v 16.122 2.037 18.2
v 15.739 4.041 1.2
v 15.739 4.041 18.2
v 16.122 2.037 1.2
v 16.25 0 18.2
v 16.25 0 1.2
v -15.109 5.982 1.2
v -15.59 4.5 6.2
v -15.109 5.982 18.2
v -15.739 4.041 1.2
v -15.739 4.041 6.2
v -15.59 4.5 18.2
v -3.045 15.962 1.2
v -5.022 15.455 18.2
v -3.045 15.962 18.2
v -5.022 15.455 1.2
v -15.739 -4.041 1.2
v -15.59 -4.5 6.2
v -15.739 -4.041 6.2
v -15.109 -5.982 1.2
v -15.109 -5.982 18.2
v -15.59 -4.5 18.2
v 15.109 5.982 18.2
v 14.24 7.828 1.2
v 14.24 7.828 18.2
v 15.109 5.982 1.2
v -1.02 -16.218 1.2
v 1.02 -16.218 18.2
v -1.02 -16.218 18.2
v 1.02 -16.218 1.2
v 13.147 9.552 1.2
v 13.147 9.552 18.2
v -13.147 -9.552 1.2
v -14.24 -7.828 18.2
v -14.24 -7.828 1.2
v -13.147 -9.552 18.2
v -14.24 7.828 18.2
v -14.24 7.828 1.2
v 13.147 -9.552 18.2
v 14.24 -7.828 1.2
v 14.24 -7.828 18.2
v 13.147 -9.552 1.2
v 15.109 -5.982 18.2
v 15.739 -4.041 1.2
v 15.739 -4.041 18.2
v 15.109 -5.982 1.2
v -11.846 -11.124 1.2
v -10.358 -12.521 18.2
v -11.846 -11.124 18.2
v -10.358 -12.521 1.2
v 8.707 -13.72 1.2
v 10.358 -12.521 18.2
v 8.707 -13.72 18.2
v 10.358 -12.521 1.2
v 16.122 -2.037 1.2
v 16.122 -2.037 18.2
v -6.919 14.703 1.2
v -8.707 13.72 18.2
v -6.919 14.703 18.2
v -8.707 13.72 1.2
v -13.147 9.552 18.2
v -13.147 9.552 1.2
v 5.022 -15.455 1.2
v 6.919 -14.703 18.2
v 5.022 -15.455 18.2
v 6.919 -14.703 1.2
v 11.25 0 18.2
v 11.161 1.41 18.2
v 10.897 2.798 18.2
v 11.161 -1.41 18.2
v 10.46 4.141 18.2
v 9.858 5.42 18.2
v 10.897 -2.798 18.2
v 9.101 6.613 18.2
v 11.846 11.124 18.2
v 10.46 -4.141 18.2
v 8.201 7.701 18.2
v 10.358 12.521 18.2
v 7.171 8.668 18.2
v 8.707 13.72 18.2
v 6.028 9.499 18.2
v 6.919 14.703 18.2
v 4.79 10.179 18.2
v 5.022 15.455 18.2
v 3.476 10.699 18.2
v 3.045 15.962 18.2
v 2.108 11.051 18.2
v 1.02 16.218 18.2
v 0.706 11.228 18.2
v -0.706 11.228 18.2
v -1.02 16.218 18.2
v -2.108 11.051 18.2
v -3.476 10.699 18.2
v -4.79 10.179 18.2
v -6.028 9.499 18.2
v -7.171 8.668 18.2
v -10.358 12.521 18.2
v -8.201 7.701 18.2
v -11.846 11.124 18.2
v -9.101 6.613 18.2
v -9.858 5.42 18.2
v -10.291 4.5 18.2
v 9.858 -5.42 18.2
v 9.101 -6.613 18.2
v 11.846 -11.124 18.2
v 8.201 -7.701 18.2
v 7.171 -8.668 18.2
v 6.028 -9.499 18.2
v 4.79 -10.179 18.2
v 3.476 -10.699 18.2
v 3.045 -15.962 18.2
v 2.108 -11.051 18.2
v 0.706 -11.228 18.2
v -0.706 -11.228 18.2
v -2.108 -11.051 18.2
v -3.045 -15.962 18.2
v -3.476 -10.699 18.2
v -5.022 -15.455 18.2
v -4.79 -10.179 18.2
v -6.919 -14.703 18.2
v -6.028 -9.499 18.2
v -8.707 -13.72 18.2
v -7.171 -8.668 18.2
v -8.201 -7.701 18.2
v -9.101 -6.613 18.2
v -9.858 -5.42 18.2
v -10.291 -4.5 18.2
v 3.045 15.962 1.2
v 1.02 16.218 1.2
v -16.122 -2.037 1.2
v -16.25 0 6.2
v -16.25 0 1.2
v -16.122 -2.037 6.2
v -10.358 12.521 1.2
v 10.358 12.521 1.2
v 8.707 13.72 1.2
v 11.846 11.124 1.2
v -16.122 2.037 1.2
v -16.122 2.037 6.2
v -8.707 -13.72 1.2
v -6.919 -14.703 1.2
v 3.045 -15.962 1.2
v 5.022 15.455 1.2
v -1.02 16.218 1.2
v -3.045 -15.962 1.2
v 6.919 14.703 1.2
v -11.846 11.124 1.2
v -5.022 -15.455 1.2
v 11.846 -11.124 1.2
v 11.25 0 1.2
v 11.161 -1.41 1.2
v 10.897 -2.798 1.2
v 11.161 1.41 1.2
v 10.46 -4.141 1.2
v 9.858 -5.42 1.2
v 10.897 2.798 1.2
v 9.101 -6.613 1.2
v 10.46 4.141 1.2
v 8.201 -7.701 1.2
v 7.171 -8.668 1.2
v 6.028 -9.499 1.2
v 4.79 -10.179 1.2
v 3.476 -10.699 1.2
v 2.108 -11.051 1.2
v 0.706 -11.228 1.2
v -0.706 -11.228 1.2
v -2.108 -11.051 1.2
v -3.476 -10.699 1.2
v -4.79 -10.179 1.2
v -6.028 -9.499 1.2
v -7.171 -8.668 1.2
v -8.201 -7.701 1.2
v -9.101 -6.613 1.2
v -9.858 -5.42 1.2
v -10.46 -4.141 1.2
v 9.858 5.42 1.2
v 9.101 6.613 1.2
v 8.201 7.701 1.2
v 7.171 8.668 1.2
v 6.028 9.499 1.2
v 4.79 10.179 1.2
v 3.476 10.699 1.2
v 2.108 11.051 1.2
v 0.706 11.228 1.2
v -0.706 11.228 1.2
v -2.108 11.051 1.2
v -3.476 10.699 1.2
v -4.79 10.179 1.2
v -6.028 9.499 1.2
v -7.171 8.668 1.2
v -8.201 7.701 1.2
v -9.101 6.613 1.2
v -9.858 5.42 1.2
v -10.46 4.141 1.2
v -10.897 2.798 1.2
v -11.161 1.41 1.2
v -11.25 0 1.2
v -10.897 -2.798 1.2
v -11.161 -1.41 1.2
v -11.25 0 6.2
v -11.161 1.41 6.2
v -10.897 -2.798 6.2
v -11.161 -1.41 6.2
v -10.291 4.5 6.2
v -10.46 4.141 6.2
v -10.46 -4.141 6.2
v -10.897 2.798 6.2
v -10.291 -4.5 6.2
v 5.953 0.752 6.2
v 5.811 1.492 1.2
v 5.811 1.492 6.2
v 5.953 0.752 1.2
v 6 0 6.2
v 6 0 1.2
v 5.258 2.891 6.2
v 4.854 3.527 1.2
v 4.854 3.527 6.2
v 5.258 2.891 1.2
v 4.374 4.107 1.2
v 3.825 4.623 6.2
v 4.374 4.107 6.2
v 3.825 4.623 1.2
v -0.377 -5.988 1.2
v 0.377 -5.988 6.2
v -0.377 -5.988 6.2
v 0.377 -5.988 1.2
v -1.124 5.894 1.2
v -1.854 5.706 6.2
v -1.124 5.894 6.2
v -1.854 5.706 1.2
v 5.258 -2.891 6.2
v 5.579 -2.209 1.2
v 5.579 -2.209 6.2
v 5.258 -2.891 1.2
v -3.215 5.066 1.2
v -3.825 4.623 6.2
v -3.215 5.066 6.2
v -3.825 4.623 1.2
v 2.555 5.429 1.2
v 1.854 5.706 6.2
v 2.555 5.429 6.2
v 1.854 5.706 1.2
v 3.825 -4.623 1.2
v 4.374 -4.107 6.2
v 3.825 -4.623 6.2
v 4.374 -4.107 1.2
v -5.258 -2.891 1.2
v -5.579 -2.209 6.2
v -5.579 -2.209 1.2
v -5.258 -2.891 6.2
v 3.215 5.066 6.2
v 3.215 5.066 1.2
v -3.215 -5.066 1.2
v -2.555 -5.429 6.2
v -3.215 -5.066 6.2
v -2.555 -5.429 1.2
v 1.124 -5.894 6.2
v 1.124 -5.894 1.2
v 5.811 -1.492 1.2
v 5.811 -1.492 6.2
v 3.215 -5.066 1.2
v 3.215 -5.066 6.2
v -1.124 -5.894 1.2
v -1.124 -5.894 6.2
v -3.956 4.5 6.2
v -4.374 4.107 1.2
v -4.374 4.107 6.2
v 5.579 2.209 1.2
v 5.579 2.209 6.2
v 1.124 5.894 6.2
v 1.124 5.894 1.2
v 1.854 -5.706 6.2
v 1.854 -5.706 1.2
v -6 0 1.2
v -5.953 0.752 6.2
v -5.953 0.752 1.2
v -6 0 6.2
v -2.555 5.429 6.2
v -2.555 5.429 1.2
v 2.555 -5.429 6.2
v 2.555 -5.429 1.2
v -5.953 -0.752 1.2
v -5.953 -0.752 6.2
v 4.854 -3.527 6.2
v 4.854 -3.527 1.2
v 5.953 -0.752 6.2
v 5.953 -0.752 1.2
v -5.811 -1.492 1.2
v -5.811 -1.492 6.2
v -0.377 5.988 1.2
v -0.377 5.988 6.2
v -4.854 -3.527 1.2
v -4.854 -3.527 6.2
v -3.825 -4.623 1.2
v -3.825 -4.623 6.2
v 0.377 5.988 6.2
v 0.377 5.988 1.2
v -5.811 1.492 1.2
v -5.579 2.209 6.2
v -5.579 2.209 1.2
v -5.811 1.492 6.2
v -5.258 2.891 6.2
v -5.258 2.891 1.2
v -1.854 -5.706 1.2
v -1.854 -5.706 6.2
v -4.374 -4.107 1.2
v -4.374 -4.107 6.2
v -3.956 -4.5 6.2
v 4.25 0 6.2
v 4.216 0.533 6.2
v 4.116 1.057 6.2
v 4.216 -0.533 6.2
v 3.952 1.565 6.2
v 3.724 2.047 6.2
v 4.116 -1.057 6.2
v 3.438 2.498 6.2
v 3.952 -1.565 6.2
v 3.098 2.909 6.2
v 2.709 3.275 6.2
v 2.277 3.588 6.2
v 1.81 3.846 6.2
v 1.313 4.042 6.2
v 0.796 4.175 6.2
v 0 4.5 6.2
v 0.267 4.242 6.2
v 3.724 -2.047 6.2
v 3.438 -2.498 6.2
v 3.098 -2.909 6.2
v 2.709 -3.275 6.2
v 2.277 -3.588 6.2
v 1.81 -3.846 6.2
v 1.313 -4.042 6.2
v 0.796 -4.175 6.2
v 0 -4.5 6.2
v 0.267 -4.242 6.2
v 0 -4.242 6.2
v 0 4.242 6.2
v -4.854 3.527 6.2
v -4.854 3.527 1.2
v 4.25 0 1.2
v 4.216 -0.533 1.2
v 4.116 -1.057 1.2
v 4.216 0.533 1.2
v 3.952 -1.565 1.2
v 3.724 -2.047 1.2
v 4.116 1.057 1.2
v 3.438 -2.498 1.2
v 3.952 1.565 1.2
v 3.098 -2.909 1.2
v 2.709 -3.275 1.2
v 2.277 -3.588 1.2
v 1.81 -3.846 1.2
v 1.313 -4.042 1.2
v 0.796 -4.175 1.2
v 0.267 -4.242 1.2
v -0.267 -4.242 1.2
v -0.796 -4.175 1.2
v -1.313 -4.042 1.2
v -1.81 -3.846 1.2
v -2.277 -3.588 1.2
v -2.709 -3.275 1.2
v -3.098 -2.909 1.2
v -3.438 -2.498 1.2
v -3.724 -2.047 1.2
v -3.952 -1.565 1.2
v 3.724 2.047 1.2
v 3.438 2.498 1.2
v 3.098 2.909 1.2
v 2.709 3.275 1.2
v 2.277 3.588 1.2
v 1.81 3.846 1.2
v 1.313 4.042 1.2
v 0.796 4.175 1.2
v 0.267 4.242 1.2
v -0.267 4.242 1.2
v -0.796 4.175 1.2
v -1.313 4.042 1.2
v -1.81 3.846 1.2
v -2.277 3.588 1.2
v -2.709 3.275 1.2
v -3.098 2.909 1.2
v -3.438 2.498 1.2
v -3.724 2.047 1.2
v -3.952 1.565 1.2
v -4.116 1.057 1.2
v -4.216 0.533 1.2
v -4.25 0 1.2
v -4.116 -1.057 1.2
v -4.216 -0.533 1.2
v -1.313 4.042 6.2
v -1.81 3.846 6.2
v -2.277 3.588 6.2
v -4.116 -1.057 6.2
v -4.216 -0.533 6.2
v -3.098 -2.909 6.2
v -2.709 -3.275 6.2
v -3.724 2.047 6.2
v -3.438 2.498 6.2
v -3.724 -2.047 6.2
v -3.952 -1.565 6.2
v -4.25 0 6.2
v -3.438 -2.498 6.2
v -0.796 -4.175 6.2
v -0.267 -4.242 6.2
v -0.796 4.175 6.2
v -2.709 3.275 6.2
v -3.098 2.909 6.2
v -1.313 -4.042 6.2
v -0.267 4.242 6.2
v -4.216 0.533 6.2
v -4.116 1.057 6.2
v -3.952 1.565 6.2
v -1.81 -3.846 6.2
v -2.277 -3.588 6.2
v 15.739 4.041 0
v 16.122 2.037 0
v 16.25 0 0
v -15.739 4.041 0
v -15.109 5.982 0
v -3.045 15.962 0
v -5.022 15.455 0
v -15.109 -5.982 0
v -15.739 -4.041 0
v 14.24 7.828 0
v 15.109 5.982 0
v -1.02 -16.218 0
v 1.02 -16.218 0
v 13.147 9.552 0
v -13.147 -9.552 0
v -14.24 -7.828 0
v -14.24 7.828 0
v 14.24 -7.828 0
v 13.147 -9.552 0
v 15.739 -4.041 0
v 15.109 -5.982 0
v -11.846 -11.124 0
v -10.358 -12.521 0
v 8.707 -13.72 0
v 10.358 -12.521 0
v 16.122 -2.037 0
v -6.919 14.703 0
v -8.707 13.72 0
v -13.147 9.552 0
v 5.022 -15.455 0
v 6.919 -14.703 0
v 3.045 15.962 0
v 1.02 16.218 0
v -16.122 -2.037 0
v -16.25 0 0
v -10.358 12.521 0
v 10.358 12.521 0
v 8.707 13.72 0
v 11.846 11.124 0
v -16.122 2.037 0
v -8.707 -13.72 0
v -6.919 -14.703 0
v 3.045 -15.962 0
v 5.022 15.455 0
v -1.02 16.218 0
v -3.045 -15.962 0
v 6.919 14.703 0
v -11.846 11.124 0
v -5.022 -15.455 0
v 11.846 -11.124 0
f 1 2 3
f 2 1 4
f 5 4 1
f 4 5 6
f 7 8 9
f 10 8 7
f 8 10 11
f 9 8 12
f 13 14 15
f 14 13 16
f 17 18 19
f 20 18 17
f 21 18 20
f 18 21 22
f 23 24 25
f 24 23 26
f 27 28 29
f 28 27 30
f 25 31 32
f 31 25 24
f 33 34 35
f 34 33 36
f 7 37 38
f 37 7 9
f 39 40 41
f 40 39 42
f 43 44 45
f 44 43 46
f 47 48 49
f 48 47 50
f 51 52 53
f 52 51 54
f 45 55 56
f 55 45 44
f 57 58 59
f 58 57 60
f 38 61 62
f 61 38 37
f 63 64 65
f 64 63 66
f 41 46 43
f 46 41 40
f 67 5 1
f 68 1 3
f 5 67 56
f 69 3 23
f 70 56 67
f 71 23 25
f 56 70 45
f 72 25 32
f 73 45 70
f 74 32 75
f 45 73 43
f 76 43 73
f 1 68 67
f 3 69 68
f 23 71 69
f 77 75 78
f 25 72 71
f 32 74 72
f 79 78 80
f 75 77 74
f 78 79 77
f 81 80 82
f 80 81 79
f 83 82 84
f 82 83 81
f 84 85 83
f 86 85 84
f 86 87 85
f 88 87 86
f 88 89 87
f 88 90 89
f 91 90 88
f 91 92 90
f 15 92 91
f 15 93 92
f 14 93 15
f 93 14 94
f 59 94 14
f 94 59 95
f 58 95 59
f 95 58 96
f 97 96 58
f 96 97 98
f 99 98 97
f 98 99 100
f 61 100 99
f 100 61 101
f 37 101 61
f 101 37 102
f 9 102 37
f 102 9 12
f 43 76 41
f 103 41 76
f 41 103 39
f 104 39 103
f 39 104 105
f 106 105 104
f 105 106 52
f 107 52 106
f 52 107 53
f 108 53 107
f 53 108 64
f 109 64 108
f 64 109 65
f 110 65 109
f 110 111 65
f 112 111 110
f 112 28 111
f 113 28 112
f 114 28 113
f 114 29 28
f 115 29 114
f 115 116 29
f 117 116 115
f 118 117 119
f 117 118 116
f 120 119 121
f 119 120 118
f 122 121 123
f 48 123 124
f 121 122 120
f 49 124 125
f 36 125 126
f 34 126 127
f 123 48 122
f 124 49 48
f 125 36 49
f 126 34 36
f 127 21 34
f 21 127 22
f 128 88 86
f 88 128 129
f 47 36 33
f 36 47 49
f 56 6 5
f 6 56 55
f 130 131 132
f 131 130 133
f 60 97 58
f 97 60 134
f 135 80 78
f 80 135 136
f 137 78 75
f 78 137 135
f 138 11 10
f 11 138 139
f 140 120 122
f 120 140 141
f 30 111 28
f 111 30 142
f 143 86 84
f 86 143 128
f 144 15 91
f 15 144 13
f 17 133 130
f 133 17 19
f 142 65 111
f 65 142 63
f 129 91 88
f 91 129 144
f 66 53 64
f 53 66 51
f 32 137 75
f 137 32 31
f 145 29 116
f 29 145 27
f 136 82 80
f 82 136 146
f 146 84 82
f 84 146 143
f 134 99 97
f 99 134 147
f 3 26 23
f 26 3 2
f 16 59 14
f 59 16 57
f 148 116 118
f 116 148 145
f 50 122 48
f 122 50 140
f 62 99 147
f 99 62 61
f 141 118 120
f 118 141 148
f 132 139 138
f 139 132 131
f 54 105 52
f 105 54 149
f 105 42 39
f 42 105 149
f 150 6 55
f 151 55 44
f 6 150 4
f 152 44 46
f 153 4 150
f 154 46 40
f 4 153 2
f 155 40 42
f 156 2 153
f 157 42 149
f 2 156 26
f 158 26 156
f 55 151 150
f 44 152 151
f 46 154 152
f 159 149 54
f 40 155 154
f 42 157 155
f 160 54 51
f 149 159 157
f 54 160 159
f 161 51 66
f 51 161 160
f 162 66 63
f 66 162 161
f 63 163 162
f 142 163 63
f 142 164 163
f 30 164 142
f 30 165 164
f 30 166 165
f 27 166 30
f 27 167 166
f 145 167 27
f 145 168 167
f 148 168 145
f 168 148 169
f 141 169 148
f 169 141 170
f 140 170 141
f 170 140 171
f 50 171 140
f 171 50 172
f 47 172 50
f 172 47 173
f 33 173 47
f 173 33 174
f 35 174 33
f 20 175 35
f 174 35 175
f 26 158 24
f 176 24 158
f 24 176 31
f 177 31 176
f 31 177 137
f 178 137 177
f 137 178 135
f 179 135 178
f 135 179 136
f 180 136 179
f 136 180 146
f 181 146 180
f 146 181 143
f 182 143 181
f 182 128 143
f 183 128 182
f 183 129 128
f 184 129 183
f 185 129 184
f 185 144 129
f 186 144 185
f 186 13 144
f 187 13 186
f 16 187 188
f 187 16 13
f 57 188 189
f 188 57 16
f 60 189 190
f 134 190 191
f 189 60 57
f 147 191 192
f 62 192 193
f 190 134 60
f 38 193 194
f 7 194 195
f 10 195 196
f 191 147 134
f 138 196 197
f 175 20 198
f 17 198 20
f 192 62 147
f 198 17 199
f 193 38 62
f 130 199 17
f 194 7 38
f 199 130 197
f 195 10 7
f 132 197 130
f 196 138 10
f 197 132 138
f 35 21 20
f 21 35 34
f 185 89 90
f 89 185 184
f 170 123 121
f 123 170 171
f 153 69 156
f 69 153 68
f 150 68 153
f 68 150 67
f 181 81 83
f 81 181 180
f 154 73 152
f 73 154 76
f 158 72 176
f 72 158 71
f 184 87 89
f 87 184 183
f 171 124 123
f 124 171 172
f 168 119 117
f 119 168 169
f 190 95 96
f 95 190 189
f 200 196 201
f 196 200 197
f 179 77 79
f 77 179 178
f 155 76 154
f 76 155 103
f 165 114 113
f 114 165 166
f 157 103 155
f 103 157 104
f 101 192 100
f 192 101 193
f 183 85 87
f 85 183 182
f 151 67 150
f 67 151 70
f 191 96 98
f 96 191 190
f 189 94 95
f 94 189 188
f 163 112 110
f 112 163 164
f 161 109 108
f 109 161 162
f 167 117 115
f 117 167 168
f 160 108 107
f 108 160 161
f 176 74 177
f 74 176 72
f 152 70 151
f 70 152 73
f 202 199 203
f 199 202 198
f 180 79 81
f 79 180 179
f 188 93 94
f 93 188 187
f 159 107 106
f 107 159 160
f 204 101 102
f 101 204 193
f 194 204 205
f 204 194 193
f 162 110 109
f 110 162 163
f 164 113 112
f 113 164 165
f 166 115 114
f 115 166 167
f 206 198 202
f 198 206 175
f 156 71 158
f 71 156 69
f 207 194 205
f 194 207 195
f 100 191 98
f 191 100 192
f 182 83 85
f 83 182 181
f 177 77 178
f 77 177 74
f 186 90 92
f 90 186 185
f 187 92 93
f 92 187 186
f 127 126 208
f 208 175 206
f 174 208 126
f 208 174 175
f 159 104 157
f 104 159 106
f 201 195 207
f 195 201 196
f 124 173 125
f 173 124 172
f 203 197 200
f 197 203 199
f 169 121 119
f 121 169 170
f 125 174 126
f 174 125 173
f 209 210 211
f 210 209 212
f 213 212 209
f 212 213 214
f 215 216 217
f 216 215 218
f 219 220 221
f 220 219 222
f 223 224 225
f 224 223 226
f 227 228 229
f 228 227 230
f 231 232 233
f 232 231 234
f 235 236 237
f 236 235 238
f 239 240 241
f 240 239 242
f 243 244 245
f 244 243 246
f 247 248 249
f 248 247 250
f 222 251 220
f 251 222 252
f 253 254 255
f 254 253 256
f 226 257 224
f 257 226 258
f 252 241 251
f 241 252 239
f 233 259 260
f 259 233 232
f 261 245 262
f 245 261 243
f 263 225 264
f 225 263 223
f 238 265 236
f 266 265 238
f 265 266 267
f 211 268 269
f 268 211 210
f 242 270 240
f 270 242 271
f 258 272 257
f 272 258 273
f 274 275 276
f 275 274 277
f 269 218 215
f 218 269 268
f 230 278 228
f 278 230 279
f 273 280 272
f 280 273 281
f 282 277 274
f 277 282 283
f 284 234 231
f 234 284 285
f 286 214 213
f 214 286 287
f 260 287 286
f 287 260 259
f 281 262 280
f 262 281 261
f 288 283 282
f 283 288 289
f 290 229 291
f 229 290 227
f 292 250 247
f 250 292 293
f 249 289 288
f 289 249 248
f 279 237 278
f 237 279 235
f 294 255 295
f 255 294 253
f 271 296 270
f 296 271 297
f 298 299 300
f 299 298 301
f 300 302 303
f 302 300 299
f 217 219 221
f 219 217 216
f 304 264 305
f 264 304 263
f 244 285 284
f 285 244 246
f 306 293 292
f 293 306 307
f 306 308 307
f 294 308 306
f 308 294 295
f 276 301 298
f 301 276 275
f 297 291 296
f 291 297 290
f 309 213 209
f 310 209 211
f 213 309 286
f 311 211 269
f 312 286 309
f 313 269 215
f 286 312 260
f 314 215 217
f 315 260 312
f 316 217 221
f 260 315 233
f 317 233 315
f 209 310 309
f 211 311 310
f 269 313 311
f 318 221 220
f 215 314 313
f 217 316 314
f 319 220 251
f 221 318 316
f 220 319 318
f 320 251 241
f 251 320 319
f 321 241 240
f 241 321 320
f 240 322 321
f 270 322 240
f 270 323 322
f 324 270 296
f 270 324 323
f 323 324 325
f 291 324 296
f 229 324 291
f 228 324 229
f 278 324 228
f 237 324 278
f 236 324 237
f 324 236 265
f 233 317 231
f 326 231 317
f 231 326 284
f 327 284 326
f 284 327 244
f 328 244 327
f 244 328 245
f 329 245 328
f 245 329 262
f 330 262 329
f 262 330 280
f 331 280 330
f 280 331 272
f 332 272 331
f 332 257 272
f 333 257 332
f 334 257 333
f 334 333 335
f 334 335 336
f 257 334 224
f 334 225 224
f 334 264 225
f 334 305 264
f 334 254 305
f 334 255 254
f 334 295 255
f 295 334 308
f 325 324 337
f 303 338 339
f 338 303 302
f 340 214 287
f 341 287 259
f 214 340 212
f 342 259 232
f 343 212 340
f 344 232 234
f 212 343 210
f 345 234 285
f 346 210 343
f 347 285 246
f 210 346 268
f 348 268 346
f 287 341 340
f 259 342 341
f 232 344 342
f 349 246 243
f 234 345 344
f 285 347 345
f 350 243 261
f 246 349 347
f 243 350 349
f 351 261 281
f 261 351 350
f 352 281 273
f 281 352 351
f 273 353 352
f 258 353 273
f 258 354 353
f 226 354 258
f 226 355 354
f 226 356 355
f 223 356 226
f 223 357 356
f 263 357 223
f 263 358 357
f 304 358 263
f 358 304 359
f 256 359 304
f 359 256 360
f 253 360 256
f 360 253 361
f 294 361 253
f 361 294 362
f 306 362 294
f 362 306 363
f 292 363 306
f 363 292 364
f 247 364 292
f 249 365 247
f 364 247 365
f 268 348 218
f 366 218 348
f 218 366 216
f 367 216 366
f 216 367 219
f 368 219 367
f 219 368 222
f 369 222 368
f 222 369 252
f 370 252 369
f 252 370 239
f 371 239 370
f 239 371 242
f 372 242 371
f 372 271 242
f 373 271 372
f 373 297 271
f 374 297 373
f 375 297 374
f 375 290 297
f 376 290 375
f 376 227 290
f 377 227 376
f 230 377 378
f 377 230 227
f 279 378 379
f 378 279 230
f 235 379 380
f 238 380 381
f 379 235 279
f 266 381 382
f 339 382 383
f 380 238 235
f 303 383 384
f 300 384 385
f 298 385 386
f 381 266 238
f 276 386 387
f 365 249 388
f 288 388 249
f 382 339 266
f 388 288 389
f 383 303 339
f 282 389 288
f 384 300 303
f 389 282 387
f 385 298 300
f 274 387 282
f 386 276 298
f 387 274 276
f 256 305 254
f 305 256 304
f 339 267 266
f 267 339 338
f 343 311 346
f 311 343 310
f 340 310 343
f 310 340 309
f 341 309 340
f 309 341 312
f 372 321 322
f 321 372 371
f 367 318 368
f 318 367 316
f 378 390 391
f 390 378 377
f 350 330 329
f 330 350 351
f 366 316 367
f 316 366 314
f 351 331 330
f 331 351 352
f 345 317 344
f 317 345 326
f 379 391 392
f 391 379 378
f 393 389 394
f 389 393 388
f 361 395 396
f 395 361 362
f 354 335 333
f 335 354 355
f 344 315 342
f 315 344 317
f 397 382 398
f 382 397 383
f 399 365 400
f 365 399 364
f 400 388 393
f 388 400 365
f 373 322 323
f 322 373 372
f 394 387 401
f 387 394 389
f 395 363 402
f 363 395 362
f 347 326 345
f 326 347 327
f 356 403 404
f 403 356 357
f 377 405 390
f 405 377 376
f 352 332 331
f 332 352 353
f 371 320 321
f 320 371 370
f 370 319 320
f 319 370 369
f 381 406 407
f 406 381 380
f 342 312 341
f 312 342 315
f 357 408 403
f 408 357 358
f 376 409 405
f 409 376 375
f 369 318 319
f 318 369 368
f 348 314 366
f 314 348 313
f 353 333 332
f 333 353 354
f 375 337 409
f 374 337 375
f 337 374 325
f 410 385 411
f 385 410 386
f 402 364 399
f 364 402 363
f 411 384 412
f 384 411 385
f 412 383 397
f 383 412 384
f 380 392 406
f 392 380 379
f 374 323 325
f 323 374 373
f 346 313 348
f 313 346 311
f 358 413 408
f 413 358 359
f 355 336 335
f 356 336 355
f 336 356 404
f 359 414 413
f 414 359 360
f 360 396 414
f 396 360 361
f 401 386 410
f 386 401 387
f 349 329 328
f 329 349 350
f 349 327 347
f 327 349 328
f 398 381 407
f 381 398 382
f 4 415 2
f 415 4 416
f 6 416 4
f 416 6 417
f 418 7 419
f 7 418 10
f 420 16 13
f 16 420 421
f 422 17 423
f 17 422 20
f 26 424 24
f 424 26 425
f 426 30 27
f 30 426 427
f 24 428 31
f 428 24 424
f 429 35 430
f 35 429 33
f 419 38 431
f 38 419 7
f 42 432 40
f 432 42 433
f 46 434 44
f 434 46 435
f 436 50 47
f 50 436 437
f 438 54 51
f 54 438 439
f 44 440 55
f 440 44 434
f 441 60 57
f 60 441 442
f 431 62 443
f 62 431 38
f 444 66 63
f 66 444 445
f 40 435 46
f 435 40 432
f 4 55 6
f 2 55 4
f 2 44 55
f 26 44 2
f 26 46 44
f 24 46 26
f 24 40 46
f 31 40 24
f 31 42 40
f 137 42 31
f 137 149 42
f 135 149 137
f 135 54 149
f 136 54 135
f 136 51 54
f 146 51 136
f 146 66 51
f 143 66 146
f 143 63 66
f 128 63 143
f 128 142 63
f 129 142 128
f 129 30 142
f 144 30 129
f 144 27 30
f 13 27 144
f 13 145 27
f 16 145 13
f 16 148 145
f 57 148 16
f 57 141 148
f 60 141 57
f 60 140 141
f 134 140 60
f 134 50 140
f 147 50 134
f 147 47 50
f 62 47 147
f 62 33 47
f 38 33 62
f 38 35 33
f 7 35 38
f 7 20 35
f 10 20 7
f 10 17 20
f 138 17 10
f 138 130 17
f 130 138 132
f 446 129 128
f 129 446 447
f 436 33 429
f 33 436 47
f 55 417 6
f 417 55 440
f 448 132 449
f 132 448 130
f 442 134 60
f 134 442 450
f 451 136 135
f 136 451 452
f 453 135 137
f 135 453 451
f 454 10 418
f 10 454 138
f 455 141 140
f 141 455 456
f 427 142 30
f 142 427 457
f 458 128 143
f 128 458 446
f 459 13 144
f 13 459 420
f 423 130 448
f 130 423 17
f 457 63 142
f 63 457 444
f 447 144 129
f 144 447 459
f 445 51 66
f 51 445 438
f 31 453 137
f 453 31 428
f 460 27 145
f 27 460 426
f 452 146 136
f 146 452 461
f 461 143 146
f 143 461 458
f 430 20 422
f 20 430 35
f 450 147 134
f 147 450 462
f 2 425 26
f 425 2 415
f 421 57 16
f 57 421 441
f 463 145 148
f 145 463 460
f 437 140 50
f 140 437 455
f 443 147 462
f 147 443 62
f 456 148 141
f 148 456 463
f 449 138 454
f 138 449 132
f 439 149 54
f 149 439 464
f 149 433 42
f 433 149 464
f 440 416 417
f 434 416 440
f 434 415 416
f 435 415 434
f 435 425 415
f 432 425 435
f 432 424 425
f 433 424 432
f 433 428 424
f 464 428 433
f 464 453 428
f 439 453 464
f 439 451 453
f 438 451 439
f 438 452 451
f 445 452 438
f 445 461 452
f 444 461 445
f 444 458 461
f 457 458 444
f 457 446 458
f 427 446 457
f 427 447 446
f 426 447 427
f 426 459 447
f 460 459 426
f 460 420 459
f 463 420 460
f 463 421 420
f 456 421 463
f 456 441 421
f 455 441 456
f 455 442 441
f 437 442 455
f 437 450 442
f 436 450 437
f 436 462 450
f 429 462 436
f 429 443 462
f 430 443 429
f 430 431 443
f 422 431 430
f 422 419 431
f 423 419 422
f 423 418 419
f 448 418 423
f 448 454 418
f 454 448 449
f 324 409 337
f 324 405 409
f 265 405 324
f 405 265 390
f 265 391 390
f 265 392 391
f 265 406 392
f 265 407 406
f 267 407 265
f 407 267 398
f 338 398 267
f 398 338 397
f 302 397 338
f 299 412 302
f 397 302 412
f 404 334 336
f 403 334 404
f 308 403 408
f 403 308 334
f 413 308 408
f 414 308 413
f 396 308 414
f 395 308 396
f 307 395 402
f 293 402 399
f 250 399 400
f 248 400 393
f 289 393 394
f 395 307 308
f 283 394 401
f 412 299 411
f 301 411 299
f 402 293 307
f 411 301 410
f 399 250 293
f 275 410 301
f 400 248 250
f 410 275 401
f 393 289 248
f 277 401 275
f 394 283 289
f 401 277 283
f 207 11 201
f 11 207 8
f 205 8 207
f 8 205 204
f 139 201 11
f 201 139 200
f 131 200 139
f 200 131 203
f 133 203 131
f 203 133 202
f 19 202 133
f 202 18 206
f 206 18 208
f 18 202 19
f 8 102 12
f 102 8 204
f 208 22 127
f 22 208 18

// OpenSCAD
bearing_catcher_id = 8.5;
bearing_catcher_od = 12;
bearing_catcher_height = 5;
tunnel_id = 22.5;
tunnel_height = 12;
wall_width = 5;
cable_channel_width = 9;
bottom = 1.2;

$fn = 50;

//cylinder(r = id, h = 10);

module Ring(ir, or, h) {
    difference() {
        cylinder(r = or, h = h);
        cylinder(r = ir, h = h * 3, center = true);
    }
}

module CableChannel() {
    translate([-20, -cable_channel_width / 2, bearing_catcher_height + bottom]) {
        cube([20, cable_channel_width, 20]);
    }
}

module Body() {
    cylinder(r = (tunnel_id / 2) + wall_width, h = bottom);
    translate([0, 0, bottom]) {
        Ring(tunnel_id / 2, (tunnel_id / 2) + wall_width, tunnel_height + bearing_catcher_height);
        Ring(bearing_catcher_id / 2, bearing_catcher_od / 2, bearing_catcher_height);
    }
}

difference() {
    Body();
    CableChannel();
}
